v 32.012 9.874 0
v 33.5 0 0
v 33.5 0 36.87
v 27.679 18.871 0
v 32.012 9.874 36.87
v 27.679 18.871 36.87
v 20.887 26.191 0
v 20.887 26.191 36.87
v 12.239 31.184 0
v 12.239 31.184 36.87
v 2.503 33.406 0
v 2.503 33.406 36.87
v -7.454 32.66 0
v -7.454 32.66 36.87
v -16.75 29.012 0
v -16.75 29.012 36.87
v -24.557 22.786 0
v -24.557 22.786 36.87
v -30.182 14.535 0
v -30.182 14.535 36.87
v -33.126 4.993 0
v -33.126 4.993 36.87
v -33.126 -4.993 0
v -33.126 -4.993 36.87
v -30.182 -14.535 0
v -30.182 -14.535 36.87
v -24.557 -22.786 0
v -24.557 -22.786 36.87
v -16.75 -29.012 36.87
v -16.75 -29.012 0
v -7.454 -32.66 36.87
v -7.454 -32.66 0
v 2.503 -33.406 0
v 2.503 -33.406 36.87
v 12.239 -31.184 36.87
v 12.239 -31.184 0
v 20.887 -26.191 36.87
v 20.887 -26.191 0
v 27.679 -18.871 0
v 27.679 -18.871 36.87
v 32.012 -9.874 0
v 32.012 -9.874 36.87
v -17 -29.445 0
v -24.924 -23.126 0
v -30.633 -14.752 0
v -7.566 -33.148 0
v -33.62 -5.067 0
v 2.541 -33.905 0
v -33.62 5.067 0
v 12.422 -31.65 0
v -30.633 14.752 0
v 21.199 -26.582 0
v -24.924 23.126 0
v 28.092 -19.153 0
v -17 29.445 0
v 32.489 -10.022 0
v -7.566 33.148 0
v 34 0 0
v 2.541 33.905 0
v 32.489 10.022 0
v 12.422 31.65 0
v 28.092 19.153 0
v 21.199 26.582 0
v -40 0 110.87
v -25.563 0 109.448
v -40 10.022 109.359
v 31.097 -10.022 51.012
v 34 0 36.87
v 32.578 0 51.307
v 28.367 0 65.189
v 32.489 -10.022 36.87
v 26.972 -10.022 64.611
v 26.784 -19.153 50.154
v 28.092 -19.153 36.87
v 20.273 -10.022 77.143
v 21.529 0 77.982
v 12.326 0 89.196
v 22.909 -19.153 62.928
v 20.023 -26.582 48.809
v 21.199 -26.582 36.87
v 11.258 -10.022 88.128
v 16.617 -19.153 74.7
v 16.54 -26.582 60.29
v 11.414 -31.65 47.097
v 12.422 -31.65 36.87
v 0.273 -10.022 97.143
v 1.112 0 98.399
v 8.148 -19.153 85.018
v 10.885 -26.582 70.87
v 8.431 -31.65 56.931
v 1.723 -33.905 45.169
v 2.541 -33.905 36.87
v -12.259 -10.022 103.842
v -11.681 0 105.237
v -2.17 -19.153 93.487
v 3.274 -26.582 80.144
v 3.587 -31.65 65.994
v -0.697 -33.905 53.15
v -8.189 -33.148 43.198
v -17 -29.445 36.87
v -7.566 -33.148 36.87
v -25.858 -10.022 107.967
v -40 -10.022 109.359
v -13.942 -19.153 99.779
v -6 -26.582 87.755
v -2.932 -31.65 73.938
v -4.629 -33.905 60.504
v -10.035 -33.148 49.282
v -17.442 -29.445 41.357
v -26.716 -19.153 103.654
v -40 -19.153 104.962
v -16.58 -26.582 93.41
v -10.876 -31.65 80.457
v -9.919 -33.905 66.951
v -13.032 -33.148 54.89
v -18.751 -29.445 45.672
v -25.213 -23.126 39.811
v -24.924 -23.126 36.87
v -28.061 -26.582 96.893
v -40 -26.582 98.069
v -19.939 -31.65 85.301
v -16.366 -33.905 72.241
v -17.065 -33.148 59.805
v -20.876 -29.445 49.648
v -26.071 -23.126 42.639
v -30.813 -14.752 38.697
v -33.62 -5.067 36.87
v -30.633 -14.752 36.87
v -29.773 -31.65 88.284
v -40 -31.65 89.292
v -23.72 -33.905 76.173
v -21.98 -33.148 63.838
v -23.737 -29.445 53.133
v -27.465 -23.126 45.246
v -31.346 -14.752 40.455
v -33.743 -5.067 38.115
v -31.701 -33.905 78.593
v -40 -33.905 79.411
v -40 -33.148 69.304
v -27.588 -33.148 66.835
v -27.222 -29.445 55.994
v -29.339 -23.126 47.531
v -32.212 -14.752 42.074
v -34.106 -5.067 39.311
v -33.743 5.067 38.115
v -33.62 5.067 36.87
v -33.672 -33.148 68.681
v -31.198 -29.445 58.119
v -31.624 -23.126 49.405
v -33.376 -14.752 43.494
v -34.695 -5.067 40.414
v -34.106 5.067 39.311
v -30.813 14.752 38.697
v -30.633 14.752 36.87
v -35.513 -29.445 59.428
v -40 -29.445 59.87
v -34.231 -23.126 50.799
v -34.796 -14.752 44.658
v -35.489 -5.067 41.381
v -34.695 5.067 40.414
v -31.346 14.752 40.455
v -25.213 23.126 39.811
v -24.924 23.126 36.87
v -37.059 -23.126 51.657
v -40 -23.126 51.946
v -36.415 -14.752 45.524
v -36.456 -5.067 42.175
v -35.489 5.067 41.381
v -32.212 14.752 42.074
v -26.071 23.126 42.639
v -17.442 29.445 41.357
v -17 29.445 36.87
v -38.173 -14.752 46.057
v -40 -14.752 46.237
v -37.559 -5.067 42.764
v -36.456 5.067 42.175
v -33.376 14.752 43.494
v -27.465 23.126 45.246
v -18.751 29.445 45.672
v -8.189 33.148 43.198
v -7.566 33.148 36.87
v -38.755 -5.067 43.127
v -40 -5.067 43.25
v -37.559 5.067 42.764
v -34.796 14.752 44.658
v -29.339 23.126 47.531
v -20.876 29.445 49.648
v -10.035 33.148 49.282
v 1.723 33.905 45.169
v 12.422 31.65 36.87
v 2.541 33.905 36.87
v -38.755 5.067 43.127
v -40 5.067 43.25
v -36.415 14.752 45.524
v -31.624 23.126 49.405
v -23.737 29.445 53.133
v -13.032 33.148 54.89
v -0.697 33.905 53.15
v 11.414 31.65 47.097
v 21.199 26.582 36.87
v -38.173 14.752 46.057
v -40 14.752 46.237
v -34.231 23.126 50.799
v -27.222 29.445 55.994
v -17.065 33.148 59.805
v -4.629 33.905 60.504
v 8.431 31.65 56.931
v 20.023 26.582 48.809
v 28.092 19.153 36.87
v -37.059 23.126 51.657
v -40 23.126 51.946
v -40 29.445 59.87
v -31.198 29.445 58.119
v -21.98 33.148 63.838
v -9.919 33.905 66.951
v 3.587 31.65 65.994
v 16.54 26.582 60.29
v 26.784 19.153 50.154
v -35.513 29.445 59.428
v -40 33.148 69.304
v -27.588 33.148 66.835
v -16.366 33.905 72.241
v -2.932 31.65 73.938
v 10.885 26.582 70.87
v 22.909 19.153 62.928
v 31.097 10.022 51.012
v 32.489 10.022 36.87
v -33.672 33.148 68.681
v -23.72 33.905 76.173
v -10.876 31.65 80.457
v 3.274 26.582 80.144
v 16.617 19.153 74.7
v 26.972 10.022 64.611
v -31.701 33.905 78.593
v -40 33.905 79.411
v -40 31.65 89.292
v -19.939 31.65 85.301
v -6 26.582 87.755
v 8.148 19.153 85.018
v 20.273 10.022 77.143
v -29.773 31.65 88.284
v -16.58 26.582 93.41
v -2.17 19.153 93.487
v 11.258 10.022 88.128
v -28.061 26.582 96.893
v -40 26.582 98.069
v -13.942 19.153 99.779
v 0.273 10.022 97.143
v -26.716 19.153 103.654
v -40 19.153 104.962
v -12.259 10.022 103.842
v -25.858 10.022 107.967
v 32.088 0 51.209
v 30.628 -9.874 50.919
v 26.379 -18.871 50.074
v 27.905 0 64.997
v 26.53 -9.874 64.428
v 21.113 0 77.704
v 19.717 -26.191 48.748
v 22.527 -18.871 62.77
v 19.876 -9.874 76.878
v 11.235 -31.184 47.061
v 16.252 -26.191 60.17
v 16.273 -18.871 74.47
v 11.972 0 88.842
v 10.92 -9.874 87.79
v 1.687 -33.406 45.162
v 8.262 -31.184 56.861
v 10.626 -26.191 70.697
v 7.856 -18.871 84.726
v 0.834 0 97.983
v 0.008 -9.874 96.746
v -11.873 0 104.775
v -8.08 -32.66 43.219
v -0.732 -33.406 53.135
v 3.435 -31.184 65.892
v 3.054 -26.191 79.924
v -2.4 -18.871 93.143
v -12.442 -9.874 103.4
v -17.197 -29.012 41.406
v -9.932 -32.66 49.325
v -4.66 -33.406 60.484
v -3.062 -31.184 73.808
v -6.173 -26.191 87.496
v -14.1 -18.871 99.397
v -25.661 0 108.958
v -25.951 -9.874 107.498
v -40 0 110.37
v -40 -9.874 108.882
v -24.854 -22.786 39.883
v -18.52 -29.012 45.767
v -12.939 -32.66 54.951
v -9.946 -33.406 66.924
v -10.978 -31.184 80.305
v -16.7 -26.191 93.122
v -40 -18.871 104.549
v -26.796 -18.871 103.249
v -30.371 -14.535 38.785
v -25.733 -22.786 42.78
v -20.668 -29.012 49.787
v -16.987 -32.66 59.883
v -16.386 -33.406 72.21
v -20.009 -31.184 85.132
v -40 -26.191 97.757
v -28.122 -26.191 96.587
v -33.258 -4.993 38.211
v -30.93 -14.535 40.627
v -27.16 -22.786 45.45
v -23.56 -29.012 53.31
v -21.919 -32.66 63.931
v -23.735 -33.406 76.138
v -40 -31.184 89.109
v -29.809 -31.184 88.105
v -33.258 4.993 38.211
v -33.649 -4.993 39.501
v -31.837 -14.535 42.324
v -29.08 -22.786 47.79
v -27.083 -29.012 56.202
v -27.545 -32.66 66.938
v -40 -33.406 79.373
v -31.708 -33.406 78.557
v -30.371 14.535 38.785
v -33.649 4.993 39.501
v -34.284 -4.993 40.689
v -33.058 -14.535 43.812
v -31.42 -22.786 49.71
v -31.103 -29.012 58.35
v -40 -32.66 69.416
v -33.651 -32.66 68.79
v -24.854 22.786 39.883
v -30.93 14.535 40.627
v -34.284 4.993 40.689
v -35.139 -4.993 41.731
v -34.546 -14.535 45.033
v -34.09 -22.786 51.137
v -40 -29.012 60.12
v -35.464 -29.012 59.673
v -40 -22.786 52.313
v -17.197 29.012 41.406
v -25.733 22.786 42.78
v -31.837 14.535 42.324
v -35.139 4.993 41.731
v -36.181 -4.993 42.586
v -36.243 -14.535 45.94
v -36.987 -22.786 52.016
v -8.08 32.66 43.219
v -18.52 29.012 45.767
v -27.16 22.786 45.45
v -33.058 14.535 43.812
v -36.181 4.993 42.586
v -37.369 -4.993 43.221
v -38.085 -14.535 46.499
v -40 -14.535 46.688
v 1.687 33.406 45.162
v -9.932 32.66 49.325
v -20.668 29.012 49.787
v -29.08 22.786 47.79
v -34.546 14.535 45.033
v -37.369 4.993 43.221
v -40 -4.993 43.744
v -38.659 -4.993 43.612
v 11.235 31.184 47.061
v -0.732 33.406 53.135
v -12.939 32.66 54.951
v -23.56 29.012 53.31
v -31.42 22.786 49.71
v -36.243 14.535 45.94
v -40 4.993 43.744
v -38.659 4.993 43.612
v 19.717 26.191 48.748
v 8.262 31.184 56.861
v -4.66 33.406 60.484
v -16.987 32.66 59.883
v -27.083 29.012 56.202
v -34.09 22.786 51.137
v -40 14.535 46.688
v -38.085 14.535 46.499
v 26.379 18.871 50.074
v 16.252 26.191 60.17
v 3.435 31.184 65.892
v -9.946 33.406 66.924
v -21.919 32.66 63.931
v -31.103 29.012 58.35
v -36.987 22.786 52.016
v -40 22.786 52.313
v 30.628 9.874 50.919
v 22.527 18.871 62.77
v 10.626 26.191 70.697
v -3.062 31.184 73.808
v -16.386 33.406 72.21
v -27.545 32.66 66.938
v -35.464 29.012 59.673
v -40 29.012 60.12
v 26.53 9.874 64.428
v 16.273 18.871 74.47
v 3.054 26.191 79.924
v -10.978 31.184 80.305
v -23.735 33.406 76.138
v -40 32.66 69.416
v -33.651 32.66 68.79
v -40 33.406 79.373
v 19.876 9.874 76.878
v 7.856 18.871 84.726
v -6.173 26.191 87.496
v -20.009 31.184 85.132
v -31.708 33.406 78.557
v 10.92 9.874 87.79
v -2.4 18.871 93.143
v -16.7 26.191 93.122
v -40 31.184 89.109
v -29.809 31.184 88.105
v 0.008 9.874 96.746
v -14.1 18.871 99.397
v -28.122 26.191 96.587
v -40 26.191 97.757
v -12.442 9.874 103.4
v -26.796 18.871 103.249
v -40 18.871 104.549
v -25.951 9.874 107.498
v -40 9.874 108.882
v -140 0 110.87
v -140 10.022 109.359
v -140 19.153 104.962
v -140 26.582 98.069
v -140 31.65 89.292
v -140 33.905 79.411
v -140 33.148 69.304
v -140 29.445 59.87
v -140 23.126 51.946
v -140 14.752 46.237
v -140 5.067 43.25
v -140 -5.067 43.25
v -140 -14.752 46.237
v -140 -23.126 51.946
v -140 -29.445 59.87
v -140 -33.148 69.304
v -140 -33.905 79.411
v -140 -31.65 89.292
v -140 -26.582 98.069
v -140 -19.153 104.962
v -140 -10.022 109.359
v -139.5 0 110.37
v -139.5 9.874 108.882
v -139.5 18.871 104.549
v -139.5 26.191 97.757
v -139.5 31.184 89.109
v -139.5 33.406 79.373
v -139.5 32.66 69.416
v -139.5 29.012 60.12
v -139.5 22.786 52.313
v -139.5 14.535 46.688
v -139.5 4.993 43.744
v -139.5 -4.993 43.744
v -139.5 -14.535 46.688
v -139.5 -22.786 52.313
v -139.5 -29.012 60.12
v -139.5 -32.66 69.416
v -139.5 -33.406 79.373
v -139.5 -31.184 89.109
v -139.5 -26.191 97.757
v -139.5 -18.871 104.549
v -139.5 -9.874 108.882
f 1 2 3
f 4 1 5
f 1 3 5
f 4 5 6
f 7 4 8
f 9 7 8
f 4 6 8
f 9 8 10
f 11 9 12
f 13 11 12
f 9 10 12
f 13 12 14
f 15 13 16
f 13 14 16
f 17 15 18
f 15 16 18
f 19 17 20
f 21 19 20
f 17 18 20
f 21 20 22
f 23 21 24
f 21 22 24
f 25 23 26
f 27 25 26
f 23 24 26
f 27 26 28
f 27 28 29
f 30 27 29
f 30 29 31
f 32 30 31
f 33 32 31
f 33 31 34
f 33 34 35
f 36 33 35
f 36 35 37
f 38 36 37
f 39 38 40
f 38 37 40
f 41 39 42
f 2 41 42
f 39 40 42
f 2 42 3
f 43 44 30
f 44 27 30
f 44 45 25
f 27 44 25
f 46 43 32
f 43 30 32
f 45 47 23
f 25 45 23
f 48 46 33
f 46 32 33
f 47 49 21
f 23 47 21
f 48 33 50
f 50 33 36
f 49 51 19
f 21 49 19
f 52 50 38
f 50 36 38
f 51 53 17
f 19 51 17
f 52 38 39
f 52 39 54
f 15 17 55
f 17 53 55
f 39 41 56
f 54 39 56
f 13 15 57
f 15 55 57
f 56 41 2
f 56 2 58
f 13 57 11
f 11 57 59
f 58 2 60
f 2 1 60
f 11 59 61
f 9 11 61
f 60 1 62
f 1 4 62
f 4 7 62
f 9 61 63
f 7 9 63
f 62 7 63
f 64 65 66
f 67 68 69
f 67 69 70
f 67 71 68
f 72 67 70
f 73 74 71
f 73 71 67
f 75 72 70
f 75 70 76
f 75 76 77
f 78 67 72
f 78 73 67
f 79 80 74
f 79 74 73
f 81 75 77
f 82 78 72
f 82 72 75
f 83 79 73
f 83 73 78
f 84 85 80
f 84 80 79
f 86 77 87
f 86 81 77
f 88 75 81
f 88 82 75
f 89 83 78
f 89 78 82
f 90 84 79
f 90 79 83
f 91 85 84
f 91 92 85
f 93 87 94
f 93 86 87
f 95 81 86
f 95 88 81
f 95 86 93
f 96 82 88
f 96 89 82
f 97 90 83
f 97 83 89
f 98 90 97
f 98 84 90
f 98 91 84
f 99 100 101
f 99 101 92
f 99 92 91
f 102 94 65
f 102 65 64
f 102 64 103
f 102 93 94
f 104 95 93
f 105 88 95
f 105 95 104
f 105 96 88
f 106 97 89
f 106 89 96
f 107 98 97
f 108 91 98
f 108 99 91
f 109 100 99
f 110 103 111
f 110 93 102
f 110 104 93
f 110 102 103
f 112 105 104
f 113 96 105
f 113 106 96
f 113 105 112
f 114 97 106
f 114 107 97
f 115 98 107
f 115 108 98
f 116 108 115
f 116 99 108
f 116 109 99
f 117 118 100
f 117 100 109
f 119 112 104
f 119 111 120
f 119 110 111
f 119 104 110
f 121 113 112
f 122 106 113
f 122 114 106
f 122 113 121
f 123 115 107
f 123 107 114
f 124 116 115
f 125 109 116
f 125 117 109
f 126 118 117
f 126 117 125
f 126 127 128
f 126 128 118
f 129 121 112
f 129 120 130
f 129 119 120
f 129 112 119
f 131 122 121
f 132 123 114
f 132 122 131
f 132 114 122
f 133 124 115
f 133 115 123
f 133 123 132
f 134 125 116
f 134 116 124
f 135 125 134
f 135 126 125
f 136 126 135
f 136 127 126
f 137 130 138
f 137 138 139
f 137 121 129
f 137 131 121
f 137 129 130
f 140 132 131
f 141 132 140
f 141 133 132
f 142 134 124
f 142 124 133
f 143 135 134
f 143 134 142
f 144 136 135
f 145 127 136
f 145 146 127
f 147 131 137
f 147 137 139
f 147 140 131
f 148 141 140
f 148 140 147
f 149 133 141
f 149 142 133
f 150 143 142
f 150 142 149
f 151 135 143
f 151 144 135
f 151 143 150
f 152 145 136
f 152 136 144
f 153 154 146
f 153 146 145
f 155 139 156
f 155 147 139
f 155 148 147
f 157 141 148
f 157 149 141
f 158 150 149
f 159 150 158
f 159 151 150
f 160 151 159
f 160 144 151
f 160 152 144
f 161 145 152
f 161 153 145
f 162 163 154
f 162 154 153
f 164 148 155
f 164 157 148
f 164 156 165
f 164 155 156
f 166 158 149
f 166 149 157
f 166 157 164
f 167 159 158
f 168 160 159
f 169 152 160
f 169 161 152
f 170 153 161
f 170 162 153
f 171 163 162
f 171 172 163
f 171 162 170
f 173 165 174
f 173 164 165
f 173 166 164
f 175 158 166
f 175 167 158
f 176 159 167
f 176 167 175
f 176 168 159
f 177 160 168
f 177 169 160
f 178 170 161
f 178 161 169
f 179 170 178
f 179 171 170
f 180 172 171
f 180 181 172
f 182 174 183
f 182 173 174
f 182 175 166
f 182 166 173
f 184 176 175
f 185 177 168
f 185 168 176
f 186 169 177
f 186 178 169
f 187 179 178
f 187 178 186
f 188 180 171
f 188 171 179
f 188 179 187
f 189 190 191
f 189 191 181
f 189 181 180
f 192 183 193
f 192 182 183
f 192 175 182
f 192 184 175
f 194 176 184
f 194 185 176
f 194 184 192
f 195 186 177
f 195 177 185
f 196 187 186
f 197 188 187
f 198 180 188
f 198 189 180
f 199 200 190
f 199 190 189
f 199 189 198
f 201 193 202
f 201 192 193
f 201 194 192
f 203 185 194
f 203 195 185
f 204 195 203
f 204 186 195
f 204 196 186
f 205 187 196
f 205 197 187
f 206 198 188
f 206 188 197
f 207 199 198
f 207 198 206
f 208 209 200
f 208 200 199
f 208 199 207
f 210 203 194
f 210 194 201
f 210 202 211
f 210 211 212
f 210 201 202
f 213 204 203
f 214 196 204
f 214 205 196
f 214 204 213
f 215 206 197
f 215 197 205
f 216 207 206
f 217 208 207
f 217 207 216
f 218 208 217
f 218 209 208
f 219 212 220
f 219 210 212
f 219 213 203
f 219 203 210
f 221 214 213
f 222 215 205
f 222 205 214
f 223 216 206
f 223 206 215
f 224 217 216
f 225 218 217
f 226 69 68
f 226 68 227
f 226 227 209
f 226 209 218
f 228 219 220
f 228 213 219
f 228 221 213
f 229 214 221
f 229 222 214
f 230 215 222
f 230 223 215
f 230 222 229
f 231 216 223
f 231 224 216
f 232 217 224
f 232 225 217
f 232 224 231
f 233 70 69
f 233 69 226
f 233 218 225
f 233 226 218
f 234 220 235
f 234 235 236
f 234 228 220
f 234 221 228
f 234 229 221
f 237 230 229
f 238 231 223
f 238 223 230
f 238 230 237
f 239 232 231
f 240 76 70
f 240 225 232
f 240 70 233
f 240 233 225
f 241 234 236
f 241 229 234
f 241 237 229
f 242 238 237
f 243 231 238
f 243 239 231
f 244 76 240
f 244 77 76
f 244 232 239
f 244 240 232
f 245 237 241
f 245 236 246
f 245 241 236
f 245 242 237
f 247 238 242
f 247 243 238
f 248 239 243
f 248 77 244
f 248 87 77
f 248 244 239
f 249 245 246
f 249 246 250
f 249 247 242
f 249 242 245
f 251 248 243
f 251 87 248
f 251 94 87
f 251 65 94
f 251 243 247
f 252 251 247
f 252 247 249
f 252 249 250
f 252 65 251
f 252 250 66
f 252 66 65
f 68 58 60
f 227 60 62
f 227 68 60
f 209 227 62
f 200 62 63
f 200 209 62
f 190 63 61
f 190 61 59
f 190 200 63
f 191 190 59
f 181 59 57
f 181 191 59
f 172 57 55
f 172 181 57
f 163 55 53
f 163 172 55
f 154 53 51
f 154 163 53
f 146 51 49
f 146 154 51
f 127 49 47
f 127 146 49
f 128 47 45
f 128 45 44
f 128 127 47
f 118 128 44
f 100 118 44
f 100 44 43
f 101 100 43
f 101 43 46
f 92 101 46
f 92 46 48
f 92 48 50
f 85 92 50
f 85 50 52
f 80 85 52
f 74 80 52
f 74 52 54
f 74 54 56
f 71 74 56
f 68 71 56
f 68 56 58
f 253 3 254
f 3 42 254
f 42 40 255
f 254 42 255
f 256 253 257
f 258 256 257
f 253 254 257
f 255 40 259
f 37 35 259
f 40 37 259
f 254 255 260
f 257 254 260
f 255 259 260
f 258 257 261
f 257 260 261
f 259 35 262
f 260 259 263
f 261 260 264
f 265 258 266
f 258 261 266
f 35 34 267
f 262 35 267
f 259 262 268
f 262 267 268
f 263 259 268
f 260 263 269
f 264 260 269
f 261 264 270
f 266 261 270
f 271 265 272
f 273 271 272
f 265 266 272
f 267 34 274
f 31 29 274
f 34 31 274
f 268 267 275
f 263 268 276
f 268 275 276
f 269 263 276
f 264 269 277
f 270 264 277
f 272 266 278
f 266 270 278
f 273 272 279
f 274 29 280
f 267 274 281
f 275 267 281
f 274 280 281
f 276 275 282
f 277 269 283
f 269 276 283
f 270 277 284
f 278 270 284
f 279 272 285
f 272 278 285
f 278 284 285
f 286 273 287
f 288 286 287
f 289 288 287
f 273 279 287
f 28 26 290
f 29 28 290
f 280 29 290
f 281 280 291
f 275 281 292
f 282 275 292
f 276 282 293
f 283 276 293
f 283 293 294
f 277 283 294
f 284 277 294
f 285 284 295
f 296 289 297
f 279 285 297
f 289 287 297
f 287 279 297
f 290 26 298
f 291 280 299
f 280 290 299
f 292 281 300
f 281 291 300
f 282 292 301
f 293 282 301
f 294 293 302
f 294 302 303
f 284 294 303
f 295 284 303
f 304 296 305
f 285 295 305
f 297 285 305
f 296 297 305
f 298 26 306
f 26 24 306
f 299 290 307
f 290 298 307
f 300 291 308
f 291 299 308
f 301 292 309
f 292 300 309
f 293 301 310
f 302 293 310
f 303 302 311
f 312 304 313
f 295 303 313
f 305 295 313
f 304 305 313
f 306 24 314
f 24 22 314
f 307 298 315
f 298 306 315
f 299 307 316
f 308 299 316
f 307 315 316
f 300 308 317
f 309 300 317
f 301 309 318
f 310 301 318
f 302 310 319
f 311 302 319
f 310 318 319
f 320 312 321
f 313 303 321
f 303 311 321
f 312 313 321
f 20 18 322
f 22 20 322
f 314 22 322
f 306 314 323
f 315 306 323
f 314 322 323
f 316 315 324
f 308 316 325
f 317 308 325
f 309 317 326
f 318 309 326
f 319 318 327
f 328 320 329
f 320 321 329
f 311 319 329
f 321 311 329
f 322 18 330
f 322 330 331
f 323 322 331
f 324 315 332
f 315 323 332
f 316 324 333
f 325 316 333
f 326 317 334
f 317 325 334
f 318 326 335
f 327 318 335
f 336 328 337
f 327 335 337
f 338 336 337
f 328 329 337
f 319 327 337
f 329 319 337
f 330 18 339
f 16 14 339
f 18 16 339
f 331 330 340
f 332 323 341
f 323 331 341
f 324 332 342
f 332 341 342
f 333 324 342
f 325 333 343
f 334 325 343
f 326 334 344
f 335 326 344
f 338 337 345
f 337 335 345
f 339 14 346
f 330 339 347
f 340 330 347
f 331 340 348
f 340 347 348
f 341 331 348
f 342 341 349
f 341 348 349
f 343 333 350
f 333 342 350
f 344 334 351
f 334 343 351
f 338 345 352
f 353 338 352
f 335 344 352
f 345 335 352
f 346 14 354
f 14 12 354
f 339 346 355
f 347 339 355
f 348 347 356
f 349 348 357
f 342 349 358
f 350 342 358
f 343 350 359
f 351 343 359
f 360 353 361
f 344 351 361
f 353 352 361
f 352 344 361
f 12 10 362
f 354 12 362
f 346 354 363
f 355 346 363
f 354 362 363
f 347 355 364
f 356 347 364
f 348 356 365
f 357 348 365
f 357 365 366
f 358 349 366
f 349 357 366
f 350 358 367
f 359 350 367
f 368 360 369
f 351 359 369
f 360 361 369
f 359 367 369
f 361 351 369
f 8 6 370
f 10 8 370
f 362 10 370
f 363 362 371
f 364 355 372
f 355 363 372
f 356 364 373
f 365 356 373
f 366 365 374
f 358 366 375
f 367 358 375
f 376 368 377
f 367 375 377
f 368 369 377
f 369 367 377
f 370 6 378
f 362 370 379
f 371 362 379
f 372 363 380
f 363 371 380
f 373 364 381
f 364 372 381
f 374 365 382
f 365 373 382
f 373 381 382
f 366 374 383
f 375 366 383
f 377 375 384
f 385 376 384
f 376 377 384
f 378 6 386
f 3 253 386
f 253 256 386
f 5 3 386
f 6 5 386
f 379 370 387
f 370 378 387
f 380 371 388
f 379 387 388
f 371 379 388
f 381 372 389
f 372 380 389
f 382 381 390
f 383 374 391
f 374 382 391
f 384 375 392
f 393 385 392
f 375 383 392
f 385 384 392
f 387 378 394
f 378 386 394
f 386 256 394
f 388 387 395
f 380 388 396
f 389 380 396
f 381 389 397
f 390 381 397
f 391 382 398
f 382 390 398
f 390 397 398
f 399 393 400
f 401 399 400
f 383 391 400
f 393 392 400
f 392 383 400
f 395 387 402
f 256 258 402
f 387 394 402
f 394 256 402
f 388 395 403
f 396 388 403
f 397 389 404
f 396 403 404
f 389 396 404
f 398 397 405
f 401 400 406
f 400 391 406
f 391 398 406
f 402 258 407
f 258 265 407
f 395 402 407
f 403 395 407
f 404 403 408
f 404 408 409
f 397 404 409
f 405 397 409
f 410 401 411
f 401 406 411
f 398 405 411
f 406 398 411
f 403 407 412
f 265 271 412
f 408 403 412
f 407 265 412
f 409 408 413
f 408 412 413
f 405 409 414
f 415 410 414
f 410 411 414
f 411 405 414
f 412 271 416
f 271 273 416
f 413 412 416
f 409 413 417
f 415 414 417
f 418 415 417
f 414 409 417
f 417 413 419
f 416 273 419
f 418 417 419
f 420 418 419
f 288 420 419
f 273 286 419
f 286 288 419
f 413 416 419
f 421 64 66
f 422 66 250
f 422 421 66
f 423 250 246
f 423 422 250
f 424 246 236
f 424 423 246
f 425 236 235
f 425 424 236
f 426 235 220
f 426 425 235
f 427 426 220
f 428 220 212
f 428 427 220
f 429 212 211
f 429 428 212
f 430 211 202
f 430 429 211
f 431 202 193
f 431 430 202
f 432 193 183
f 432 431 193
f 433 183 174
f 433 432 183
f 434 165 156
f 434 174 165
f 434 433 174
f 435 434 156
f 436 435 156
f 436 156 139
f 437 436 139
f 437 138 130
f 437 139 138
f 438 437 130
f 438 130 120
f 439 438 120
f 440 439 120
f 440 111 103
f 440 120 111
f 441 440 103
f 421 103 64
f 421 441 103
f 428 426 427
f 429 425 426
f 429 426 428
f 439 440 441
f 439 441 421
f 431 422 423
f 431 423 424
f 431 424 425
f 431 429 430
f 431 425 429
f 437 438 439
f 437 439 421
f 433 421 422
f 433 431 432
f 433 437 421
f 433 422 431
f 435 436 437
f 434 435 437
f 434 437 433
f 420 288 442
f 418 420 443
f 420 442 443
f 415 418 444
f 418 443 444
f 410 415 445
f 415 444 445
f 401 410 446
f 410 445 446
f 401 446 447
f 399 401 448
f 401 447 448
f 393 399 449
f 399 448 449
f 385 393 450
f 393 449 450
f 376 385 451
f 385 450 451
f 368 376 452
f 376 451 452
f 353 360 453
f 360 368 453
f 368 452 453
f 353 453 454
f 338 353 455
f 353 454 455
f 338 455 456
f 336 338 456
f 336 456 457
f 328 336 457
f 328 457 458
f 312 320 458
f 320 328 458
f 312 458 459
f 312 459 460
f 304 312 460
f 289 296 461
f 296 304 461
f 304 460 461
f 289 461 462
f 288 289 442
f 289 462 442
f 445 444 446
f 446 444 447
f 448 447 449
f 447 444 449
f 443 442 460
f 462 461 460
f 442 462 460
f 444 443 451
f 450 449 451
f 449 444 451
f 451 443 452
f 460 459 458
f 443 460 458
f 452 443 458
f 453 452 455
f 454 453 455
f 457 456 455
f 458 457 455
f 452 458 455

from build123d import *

# Parameters (mm, degrees)
SWEEP1_PROFILE_R = 34
SHELL1_T         = -0.5


with BuildPart() as part:
    # Sweep1: sweep along a curve in space
    with BuildLine() as sweep1_path:
        Line((0, 0, 0), (0, 0, 36.87))
        ThreePointArc((0, 0, 36.87), (-11.715728753, 0, 65.154271247), (-40, 0, 76.87))
        Line((-40, 0, 76.87), (-140, 0, 76.87))
    # Sweep1 profile (on start of the path) → Sweep1 (sweep)
    with BuildSketch(Plane.XY):
        Circle(SWEEP1_PROFILE_R)
    sweep(path=sweep1_path.line)

    # Shell1
    shell1_openings = [part.faces().sort_by_distance(p)[0] for p in [
        (0, 0, 0),
    ]]
    offset(amount=SHELL1_T, openings=shell1_openings, kind=Kind.INTERSECTION)


solid = part.part
